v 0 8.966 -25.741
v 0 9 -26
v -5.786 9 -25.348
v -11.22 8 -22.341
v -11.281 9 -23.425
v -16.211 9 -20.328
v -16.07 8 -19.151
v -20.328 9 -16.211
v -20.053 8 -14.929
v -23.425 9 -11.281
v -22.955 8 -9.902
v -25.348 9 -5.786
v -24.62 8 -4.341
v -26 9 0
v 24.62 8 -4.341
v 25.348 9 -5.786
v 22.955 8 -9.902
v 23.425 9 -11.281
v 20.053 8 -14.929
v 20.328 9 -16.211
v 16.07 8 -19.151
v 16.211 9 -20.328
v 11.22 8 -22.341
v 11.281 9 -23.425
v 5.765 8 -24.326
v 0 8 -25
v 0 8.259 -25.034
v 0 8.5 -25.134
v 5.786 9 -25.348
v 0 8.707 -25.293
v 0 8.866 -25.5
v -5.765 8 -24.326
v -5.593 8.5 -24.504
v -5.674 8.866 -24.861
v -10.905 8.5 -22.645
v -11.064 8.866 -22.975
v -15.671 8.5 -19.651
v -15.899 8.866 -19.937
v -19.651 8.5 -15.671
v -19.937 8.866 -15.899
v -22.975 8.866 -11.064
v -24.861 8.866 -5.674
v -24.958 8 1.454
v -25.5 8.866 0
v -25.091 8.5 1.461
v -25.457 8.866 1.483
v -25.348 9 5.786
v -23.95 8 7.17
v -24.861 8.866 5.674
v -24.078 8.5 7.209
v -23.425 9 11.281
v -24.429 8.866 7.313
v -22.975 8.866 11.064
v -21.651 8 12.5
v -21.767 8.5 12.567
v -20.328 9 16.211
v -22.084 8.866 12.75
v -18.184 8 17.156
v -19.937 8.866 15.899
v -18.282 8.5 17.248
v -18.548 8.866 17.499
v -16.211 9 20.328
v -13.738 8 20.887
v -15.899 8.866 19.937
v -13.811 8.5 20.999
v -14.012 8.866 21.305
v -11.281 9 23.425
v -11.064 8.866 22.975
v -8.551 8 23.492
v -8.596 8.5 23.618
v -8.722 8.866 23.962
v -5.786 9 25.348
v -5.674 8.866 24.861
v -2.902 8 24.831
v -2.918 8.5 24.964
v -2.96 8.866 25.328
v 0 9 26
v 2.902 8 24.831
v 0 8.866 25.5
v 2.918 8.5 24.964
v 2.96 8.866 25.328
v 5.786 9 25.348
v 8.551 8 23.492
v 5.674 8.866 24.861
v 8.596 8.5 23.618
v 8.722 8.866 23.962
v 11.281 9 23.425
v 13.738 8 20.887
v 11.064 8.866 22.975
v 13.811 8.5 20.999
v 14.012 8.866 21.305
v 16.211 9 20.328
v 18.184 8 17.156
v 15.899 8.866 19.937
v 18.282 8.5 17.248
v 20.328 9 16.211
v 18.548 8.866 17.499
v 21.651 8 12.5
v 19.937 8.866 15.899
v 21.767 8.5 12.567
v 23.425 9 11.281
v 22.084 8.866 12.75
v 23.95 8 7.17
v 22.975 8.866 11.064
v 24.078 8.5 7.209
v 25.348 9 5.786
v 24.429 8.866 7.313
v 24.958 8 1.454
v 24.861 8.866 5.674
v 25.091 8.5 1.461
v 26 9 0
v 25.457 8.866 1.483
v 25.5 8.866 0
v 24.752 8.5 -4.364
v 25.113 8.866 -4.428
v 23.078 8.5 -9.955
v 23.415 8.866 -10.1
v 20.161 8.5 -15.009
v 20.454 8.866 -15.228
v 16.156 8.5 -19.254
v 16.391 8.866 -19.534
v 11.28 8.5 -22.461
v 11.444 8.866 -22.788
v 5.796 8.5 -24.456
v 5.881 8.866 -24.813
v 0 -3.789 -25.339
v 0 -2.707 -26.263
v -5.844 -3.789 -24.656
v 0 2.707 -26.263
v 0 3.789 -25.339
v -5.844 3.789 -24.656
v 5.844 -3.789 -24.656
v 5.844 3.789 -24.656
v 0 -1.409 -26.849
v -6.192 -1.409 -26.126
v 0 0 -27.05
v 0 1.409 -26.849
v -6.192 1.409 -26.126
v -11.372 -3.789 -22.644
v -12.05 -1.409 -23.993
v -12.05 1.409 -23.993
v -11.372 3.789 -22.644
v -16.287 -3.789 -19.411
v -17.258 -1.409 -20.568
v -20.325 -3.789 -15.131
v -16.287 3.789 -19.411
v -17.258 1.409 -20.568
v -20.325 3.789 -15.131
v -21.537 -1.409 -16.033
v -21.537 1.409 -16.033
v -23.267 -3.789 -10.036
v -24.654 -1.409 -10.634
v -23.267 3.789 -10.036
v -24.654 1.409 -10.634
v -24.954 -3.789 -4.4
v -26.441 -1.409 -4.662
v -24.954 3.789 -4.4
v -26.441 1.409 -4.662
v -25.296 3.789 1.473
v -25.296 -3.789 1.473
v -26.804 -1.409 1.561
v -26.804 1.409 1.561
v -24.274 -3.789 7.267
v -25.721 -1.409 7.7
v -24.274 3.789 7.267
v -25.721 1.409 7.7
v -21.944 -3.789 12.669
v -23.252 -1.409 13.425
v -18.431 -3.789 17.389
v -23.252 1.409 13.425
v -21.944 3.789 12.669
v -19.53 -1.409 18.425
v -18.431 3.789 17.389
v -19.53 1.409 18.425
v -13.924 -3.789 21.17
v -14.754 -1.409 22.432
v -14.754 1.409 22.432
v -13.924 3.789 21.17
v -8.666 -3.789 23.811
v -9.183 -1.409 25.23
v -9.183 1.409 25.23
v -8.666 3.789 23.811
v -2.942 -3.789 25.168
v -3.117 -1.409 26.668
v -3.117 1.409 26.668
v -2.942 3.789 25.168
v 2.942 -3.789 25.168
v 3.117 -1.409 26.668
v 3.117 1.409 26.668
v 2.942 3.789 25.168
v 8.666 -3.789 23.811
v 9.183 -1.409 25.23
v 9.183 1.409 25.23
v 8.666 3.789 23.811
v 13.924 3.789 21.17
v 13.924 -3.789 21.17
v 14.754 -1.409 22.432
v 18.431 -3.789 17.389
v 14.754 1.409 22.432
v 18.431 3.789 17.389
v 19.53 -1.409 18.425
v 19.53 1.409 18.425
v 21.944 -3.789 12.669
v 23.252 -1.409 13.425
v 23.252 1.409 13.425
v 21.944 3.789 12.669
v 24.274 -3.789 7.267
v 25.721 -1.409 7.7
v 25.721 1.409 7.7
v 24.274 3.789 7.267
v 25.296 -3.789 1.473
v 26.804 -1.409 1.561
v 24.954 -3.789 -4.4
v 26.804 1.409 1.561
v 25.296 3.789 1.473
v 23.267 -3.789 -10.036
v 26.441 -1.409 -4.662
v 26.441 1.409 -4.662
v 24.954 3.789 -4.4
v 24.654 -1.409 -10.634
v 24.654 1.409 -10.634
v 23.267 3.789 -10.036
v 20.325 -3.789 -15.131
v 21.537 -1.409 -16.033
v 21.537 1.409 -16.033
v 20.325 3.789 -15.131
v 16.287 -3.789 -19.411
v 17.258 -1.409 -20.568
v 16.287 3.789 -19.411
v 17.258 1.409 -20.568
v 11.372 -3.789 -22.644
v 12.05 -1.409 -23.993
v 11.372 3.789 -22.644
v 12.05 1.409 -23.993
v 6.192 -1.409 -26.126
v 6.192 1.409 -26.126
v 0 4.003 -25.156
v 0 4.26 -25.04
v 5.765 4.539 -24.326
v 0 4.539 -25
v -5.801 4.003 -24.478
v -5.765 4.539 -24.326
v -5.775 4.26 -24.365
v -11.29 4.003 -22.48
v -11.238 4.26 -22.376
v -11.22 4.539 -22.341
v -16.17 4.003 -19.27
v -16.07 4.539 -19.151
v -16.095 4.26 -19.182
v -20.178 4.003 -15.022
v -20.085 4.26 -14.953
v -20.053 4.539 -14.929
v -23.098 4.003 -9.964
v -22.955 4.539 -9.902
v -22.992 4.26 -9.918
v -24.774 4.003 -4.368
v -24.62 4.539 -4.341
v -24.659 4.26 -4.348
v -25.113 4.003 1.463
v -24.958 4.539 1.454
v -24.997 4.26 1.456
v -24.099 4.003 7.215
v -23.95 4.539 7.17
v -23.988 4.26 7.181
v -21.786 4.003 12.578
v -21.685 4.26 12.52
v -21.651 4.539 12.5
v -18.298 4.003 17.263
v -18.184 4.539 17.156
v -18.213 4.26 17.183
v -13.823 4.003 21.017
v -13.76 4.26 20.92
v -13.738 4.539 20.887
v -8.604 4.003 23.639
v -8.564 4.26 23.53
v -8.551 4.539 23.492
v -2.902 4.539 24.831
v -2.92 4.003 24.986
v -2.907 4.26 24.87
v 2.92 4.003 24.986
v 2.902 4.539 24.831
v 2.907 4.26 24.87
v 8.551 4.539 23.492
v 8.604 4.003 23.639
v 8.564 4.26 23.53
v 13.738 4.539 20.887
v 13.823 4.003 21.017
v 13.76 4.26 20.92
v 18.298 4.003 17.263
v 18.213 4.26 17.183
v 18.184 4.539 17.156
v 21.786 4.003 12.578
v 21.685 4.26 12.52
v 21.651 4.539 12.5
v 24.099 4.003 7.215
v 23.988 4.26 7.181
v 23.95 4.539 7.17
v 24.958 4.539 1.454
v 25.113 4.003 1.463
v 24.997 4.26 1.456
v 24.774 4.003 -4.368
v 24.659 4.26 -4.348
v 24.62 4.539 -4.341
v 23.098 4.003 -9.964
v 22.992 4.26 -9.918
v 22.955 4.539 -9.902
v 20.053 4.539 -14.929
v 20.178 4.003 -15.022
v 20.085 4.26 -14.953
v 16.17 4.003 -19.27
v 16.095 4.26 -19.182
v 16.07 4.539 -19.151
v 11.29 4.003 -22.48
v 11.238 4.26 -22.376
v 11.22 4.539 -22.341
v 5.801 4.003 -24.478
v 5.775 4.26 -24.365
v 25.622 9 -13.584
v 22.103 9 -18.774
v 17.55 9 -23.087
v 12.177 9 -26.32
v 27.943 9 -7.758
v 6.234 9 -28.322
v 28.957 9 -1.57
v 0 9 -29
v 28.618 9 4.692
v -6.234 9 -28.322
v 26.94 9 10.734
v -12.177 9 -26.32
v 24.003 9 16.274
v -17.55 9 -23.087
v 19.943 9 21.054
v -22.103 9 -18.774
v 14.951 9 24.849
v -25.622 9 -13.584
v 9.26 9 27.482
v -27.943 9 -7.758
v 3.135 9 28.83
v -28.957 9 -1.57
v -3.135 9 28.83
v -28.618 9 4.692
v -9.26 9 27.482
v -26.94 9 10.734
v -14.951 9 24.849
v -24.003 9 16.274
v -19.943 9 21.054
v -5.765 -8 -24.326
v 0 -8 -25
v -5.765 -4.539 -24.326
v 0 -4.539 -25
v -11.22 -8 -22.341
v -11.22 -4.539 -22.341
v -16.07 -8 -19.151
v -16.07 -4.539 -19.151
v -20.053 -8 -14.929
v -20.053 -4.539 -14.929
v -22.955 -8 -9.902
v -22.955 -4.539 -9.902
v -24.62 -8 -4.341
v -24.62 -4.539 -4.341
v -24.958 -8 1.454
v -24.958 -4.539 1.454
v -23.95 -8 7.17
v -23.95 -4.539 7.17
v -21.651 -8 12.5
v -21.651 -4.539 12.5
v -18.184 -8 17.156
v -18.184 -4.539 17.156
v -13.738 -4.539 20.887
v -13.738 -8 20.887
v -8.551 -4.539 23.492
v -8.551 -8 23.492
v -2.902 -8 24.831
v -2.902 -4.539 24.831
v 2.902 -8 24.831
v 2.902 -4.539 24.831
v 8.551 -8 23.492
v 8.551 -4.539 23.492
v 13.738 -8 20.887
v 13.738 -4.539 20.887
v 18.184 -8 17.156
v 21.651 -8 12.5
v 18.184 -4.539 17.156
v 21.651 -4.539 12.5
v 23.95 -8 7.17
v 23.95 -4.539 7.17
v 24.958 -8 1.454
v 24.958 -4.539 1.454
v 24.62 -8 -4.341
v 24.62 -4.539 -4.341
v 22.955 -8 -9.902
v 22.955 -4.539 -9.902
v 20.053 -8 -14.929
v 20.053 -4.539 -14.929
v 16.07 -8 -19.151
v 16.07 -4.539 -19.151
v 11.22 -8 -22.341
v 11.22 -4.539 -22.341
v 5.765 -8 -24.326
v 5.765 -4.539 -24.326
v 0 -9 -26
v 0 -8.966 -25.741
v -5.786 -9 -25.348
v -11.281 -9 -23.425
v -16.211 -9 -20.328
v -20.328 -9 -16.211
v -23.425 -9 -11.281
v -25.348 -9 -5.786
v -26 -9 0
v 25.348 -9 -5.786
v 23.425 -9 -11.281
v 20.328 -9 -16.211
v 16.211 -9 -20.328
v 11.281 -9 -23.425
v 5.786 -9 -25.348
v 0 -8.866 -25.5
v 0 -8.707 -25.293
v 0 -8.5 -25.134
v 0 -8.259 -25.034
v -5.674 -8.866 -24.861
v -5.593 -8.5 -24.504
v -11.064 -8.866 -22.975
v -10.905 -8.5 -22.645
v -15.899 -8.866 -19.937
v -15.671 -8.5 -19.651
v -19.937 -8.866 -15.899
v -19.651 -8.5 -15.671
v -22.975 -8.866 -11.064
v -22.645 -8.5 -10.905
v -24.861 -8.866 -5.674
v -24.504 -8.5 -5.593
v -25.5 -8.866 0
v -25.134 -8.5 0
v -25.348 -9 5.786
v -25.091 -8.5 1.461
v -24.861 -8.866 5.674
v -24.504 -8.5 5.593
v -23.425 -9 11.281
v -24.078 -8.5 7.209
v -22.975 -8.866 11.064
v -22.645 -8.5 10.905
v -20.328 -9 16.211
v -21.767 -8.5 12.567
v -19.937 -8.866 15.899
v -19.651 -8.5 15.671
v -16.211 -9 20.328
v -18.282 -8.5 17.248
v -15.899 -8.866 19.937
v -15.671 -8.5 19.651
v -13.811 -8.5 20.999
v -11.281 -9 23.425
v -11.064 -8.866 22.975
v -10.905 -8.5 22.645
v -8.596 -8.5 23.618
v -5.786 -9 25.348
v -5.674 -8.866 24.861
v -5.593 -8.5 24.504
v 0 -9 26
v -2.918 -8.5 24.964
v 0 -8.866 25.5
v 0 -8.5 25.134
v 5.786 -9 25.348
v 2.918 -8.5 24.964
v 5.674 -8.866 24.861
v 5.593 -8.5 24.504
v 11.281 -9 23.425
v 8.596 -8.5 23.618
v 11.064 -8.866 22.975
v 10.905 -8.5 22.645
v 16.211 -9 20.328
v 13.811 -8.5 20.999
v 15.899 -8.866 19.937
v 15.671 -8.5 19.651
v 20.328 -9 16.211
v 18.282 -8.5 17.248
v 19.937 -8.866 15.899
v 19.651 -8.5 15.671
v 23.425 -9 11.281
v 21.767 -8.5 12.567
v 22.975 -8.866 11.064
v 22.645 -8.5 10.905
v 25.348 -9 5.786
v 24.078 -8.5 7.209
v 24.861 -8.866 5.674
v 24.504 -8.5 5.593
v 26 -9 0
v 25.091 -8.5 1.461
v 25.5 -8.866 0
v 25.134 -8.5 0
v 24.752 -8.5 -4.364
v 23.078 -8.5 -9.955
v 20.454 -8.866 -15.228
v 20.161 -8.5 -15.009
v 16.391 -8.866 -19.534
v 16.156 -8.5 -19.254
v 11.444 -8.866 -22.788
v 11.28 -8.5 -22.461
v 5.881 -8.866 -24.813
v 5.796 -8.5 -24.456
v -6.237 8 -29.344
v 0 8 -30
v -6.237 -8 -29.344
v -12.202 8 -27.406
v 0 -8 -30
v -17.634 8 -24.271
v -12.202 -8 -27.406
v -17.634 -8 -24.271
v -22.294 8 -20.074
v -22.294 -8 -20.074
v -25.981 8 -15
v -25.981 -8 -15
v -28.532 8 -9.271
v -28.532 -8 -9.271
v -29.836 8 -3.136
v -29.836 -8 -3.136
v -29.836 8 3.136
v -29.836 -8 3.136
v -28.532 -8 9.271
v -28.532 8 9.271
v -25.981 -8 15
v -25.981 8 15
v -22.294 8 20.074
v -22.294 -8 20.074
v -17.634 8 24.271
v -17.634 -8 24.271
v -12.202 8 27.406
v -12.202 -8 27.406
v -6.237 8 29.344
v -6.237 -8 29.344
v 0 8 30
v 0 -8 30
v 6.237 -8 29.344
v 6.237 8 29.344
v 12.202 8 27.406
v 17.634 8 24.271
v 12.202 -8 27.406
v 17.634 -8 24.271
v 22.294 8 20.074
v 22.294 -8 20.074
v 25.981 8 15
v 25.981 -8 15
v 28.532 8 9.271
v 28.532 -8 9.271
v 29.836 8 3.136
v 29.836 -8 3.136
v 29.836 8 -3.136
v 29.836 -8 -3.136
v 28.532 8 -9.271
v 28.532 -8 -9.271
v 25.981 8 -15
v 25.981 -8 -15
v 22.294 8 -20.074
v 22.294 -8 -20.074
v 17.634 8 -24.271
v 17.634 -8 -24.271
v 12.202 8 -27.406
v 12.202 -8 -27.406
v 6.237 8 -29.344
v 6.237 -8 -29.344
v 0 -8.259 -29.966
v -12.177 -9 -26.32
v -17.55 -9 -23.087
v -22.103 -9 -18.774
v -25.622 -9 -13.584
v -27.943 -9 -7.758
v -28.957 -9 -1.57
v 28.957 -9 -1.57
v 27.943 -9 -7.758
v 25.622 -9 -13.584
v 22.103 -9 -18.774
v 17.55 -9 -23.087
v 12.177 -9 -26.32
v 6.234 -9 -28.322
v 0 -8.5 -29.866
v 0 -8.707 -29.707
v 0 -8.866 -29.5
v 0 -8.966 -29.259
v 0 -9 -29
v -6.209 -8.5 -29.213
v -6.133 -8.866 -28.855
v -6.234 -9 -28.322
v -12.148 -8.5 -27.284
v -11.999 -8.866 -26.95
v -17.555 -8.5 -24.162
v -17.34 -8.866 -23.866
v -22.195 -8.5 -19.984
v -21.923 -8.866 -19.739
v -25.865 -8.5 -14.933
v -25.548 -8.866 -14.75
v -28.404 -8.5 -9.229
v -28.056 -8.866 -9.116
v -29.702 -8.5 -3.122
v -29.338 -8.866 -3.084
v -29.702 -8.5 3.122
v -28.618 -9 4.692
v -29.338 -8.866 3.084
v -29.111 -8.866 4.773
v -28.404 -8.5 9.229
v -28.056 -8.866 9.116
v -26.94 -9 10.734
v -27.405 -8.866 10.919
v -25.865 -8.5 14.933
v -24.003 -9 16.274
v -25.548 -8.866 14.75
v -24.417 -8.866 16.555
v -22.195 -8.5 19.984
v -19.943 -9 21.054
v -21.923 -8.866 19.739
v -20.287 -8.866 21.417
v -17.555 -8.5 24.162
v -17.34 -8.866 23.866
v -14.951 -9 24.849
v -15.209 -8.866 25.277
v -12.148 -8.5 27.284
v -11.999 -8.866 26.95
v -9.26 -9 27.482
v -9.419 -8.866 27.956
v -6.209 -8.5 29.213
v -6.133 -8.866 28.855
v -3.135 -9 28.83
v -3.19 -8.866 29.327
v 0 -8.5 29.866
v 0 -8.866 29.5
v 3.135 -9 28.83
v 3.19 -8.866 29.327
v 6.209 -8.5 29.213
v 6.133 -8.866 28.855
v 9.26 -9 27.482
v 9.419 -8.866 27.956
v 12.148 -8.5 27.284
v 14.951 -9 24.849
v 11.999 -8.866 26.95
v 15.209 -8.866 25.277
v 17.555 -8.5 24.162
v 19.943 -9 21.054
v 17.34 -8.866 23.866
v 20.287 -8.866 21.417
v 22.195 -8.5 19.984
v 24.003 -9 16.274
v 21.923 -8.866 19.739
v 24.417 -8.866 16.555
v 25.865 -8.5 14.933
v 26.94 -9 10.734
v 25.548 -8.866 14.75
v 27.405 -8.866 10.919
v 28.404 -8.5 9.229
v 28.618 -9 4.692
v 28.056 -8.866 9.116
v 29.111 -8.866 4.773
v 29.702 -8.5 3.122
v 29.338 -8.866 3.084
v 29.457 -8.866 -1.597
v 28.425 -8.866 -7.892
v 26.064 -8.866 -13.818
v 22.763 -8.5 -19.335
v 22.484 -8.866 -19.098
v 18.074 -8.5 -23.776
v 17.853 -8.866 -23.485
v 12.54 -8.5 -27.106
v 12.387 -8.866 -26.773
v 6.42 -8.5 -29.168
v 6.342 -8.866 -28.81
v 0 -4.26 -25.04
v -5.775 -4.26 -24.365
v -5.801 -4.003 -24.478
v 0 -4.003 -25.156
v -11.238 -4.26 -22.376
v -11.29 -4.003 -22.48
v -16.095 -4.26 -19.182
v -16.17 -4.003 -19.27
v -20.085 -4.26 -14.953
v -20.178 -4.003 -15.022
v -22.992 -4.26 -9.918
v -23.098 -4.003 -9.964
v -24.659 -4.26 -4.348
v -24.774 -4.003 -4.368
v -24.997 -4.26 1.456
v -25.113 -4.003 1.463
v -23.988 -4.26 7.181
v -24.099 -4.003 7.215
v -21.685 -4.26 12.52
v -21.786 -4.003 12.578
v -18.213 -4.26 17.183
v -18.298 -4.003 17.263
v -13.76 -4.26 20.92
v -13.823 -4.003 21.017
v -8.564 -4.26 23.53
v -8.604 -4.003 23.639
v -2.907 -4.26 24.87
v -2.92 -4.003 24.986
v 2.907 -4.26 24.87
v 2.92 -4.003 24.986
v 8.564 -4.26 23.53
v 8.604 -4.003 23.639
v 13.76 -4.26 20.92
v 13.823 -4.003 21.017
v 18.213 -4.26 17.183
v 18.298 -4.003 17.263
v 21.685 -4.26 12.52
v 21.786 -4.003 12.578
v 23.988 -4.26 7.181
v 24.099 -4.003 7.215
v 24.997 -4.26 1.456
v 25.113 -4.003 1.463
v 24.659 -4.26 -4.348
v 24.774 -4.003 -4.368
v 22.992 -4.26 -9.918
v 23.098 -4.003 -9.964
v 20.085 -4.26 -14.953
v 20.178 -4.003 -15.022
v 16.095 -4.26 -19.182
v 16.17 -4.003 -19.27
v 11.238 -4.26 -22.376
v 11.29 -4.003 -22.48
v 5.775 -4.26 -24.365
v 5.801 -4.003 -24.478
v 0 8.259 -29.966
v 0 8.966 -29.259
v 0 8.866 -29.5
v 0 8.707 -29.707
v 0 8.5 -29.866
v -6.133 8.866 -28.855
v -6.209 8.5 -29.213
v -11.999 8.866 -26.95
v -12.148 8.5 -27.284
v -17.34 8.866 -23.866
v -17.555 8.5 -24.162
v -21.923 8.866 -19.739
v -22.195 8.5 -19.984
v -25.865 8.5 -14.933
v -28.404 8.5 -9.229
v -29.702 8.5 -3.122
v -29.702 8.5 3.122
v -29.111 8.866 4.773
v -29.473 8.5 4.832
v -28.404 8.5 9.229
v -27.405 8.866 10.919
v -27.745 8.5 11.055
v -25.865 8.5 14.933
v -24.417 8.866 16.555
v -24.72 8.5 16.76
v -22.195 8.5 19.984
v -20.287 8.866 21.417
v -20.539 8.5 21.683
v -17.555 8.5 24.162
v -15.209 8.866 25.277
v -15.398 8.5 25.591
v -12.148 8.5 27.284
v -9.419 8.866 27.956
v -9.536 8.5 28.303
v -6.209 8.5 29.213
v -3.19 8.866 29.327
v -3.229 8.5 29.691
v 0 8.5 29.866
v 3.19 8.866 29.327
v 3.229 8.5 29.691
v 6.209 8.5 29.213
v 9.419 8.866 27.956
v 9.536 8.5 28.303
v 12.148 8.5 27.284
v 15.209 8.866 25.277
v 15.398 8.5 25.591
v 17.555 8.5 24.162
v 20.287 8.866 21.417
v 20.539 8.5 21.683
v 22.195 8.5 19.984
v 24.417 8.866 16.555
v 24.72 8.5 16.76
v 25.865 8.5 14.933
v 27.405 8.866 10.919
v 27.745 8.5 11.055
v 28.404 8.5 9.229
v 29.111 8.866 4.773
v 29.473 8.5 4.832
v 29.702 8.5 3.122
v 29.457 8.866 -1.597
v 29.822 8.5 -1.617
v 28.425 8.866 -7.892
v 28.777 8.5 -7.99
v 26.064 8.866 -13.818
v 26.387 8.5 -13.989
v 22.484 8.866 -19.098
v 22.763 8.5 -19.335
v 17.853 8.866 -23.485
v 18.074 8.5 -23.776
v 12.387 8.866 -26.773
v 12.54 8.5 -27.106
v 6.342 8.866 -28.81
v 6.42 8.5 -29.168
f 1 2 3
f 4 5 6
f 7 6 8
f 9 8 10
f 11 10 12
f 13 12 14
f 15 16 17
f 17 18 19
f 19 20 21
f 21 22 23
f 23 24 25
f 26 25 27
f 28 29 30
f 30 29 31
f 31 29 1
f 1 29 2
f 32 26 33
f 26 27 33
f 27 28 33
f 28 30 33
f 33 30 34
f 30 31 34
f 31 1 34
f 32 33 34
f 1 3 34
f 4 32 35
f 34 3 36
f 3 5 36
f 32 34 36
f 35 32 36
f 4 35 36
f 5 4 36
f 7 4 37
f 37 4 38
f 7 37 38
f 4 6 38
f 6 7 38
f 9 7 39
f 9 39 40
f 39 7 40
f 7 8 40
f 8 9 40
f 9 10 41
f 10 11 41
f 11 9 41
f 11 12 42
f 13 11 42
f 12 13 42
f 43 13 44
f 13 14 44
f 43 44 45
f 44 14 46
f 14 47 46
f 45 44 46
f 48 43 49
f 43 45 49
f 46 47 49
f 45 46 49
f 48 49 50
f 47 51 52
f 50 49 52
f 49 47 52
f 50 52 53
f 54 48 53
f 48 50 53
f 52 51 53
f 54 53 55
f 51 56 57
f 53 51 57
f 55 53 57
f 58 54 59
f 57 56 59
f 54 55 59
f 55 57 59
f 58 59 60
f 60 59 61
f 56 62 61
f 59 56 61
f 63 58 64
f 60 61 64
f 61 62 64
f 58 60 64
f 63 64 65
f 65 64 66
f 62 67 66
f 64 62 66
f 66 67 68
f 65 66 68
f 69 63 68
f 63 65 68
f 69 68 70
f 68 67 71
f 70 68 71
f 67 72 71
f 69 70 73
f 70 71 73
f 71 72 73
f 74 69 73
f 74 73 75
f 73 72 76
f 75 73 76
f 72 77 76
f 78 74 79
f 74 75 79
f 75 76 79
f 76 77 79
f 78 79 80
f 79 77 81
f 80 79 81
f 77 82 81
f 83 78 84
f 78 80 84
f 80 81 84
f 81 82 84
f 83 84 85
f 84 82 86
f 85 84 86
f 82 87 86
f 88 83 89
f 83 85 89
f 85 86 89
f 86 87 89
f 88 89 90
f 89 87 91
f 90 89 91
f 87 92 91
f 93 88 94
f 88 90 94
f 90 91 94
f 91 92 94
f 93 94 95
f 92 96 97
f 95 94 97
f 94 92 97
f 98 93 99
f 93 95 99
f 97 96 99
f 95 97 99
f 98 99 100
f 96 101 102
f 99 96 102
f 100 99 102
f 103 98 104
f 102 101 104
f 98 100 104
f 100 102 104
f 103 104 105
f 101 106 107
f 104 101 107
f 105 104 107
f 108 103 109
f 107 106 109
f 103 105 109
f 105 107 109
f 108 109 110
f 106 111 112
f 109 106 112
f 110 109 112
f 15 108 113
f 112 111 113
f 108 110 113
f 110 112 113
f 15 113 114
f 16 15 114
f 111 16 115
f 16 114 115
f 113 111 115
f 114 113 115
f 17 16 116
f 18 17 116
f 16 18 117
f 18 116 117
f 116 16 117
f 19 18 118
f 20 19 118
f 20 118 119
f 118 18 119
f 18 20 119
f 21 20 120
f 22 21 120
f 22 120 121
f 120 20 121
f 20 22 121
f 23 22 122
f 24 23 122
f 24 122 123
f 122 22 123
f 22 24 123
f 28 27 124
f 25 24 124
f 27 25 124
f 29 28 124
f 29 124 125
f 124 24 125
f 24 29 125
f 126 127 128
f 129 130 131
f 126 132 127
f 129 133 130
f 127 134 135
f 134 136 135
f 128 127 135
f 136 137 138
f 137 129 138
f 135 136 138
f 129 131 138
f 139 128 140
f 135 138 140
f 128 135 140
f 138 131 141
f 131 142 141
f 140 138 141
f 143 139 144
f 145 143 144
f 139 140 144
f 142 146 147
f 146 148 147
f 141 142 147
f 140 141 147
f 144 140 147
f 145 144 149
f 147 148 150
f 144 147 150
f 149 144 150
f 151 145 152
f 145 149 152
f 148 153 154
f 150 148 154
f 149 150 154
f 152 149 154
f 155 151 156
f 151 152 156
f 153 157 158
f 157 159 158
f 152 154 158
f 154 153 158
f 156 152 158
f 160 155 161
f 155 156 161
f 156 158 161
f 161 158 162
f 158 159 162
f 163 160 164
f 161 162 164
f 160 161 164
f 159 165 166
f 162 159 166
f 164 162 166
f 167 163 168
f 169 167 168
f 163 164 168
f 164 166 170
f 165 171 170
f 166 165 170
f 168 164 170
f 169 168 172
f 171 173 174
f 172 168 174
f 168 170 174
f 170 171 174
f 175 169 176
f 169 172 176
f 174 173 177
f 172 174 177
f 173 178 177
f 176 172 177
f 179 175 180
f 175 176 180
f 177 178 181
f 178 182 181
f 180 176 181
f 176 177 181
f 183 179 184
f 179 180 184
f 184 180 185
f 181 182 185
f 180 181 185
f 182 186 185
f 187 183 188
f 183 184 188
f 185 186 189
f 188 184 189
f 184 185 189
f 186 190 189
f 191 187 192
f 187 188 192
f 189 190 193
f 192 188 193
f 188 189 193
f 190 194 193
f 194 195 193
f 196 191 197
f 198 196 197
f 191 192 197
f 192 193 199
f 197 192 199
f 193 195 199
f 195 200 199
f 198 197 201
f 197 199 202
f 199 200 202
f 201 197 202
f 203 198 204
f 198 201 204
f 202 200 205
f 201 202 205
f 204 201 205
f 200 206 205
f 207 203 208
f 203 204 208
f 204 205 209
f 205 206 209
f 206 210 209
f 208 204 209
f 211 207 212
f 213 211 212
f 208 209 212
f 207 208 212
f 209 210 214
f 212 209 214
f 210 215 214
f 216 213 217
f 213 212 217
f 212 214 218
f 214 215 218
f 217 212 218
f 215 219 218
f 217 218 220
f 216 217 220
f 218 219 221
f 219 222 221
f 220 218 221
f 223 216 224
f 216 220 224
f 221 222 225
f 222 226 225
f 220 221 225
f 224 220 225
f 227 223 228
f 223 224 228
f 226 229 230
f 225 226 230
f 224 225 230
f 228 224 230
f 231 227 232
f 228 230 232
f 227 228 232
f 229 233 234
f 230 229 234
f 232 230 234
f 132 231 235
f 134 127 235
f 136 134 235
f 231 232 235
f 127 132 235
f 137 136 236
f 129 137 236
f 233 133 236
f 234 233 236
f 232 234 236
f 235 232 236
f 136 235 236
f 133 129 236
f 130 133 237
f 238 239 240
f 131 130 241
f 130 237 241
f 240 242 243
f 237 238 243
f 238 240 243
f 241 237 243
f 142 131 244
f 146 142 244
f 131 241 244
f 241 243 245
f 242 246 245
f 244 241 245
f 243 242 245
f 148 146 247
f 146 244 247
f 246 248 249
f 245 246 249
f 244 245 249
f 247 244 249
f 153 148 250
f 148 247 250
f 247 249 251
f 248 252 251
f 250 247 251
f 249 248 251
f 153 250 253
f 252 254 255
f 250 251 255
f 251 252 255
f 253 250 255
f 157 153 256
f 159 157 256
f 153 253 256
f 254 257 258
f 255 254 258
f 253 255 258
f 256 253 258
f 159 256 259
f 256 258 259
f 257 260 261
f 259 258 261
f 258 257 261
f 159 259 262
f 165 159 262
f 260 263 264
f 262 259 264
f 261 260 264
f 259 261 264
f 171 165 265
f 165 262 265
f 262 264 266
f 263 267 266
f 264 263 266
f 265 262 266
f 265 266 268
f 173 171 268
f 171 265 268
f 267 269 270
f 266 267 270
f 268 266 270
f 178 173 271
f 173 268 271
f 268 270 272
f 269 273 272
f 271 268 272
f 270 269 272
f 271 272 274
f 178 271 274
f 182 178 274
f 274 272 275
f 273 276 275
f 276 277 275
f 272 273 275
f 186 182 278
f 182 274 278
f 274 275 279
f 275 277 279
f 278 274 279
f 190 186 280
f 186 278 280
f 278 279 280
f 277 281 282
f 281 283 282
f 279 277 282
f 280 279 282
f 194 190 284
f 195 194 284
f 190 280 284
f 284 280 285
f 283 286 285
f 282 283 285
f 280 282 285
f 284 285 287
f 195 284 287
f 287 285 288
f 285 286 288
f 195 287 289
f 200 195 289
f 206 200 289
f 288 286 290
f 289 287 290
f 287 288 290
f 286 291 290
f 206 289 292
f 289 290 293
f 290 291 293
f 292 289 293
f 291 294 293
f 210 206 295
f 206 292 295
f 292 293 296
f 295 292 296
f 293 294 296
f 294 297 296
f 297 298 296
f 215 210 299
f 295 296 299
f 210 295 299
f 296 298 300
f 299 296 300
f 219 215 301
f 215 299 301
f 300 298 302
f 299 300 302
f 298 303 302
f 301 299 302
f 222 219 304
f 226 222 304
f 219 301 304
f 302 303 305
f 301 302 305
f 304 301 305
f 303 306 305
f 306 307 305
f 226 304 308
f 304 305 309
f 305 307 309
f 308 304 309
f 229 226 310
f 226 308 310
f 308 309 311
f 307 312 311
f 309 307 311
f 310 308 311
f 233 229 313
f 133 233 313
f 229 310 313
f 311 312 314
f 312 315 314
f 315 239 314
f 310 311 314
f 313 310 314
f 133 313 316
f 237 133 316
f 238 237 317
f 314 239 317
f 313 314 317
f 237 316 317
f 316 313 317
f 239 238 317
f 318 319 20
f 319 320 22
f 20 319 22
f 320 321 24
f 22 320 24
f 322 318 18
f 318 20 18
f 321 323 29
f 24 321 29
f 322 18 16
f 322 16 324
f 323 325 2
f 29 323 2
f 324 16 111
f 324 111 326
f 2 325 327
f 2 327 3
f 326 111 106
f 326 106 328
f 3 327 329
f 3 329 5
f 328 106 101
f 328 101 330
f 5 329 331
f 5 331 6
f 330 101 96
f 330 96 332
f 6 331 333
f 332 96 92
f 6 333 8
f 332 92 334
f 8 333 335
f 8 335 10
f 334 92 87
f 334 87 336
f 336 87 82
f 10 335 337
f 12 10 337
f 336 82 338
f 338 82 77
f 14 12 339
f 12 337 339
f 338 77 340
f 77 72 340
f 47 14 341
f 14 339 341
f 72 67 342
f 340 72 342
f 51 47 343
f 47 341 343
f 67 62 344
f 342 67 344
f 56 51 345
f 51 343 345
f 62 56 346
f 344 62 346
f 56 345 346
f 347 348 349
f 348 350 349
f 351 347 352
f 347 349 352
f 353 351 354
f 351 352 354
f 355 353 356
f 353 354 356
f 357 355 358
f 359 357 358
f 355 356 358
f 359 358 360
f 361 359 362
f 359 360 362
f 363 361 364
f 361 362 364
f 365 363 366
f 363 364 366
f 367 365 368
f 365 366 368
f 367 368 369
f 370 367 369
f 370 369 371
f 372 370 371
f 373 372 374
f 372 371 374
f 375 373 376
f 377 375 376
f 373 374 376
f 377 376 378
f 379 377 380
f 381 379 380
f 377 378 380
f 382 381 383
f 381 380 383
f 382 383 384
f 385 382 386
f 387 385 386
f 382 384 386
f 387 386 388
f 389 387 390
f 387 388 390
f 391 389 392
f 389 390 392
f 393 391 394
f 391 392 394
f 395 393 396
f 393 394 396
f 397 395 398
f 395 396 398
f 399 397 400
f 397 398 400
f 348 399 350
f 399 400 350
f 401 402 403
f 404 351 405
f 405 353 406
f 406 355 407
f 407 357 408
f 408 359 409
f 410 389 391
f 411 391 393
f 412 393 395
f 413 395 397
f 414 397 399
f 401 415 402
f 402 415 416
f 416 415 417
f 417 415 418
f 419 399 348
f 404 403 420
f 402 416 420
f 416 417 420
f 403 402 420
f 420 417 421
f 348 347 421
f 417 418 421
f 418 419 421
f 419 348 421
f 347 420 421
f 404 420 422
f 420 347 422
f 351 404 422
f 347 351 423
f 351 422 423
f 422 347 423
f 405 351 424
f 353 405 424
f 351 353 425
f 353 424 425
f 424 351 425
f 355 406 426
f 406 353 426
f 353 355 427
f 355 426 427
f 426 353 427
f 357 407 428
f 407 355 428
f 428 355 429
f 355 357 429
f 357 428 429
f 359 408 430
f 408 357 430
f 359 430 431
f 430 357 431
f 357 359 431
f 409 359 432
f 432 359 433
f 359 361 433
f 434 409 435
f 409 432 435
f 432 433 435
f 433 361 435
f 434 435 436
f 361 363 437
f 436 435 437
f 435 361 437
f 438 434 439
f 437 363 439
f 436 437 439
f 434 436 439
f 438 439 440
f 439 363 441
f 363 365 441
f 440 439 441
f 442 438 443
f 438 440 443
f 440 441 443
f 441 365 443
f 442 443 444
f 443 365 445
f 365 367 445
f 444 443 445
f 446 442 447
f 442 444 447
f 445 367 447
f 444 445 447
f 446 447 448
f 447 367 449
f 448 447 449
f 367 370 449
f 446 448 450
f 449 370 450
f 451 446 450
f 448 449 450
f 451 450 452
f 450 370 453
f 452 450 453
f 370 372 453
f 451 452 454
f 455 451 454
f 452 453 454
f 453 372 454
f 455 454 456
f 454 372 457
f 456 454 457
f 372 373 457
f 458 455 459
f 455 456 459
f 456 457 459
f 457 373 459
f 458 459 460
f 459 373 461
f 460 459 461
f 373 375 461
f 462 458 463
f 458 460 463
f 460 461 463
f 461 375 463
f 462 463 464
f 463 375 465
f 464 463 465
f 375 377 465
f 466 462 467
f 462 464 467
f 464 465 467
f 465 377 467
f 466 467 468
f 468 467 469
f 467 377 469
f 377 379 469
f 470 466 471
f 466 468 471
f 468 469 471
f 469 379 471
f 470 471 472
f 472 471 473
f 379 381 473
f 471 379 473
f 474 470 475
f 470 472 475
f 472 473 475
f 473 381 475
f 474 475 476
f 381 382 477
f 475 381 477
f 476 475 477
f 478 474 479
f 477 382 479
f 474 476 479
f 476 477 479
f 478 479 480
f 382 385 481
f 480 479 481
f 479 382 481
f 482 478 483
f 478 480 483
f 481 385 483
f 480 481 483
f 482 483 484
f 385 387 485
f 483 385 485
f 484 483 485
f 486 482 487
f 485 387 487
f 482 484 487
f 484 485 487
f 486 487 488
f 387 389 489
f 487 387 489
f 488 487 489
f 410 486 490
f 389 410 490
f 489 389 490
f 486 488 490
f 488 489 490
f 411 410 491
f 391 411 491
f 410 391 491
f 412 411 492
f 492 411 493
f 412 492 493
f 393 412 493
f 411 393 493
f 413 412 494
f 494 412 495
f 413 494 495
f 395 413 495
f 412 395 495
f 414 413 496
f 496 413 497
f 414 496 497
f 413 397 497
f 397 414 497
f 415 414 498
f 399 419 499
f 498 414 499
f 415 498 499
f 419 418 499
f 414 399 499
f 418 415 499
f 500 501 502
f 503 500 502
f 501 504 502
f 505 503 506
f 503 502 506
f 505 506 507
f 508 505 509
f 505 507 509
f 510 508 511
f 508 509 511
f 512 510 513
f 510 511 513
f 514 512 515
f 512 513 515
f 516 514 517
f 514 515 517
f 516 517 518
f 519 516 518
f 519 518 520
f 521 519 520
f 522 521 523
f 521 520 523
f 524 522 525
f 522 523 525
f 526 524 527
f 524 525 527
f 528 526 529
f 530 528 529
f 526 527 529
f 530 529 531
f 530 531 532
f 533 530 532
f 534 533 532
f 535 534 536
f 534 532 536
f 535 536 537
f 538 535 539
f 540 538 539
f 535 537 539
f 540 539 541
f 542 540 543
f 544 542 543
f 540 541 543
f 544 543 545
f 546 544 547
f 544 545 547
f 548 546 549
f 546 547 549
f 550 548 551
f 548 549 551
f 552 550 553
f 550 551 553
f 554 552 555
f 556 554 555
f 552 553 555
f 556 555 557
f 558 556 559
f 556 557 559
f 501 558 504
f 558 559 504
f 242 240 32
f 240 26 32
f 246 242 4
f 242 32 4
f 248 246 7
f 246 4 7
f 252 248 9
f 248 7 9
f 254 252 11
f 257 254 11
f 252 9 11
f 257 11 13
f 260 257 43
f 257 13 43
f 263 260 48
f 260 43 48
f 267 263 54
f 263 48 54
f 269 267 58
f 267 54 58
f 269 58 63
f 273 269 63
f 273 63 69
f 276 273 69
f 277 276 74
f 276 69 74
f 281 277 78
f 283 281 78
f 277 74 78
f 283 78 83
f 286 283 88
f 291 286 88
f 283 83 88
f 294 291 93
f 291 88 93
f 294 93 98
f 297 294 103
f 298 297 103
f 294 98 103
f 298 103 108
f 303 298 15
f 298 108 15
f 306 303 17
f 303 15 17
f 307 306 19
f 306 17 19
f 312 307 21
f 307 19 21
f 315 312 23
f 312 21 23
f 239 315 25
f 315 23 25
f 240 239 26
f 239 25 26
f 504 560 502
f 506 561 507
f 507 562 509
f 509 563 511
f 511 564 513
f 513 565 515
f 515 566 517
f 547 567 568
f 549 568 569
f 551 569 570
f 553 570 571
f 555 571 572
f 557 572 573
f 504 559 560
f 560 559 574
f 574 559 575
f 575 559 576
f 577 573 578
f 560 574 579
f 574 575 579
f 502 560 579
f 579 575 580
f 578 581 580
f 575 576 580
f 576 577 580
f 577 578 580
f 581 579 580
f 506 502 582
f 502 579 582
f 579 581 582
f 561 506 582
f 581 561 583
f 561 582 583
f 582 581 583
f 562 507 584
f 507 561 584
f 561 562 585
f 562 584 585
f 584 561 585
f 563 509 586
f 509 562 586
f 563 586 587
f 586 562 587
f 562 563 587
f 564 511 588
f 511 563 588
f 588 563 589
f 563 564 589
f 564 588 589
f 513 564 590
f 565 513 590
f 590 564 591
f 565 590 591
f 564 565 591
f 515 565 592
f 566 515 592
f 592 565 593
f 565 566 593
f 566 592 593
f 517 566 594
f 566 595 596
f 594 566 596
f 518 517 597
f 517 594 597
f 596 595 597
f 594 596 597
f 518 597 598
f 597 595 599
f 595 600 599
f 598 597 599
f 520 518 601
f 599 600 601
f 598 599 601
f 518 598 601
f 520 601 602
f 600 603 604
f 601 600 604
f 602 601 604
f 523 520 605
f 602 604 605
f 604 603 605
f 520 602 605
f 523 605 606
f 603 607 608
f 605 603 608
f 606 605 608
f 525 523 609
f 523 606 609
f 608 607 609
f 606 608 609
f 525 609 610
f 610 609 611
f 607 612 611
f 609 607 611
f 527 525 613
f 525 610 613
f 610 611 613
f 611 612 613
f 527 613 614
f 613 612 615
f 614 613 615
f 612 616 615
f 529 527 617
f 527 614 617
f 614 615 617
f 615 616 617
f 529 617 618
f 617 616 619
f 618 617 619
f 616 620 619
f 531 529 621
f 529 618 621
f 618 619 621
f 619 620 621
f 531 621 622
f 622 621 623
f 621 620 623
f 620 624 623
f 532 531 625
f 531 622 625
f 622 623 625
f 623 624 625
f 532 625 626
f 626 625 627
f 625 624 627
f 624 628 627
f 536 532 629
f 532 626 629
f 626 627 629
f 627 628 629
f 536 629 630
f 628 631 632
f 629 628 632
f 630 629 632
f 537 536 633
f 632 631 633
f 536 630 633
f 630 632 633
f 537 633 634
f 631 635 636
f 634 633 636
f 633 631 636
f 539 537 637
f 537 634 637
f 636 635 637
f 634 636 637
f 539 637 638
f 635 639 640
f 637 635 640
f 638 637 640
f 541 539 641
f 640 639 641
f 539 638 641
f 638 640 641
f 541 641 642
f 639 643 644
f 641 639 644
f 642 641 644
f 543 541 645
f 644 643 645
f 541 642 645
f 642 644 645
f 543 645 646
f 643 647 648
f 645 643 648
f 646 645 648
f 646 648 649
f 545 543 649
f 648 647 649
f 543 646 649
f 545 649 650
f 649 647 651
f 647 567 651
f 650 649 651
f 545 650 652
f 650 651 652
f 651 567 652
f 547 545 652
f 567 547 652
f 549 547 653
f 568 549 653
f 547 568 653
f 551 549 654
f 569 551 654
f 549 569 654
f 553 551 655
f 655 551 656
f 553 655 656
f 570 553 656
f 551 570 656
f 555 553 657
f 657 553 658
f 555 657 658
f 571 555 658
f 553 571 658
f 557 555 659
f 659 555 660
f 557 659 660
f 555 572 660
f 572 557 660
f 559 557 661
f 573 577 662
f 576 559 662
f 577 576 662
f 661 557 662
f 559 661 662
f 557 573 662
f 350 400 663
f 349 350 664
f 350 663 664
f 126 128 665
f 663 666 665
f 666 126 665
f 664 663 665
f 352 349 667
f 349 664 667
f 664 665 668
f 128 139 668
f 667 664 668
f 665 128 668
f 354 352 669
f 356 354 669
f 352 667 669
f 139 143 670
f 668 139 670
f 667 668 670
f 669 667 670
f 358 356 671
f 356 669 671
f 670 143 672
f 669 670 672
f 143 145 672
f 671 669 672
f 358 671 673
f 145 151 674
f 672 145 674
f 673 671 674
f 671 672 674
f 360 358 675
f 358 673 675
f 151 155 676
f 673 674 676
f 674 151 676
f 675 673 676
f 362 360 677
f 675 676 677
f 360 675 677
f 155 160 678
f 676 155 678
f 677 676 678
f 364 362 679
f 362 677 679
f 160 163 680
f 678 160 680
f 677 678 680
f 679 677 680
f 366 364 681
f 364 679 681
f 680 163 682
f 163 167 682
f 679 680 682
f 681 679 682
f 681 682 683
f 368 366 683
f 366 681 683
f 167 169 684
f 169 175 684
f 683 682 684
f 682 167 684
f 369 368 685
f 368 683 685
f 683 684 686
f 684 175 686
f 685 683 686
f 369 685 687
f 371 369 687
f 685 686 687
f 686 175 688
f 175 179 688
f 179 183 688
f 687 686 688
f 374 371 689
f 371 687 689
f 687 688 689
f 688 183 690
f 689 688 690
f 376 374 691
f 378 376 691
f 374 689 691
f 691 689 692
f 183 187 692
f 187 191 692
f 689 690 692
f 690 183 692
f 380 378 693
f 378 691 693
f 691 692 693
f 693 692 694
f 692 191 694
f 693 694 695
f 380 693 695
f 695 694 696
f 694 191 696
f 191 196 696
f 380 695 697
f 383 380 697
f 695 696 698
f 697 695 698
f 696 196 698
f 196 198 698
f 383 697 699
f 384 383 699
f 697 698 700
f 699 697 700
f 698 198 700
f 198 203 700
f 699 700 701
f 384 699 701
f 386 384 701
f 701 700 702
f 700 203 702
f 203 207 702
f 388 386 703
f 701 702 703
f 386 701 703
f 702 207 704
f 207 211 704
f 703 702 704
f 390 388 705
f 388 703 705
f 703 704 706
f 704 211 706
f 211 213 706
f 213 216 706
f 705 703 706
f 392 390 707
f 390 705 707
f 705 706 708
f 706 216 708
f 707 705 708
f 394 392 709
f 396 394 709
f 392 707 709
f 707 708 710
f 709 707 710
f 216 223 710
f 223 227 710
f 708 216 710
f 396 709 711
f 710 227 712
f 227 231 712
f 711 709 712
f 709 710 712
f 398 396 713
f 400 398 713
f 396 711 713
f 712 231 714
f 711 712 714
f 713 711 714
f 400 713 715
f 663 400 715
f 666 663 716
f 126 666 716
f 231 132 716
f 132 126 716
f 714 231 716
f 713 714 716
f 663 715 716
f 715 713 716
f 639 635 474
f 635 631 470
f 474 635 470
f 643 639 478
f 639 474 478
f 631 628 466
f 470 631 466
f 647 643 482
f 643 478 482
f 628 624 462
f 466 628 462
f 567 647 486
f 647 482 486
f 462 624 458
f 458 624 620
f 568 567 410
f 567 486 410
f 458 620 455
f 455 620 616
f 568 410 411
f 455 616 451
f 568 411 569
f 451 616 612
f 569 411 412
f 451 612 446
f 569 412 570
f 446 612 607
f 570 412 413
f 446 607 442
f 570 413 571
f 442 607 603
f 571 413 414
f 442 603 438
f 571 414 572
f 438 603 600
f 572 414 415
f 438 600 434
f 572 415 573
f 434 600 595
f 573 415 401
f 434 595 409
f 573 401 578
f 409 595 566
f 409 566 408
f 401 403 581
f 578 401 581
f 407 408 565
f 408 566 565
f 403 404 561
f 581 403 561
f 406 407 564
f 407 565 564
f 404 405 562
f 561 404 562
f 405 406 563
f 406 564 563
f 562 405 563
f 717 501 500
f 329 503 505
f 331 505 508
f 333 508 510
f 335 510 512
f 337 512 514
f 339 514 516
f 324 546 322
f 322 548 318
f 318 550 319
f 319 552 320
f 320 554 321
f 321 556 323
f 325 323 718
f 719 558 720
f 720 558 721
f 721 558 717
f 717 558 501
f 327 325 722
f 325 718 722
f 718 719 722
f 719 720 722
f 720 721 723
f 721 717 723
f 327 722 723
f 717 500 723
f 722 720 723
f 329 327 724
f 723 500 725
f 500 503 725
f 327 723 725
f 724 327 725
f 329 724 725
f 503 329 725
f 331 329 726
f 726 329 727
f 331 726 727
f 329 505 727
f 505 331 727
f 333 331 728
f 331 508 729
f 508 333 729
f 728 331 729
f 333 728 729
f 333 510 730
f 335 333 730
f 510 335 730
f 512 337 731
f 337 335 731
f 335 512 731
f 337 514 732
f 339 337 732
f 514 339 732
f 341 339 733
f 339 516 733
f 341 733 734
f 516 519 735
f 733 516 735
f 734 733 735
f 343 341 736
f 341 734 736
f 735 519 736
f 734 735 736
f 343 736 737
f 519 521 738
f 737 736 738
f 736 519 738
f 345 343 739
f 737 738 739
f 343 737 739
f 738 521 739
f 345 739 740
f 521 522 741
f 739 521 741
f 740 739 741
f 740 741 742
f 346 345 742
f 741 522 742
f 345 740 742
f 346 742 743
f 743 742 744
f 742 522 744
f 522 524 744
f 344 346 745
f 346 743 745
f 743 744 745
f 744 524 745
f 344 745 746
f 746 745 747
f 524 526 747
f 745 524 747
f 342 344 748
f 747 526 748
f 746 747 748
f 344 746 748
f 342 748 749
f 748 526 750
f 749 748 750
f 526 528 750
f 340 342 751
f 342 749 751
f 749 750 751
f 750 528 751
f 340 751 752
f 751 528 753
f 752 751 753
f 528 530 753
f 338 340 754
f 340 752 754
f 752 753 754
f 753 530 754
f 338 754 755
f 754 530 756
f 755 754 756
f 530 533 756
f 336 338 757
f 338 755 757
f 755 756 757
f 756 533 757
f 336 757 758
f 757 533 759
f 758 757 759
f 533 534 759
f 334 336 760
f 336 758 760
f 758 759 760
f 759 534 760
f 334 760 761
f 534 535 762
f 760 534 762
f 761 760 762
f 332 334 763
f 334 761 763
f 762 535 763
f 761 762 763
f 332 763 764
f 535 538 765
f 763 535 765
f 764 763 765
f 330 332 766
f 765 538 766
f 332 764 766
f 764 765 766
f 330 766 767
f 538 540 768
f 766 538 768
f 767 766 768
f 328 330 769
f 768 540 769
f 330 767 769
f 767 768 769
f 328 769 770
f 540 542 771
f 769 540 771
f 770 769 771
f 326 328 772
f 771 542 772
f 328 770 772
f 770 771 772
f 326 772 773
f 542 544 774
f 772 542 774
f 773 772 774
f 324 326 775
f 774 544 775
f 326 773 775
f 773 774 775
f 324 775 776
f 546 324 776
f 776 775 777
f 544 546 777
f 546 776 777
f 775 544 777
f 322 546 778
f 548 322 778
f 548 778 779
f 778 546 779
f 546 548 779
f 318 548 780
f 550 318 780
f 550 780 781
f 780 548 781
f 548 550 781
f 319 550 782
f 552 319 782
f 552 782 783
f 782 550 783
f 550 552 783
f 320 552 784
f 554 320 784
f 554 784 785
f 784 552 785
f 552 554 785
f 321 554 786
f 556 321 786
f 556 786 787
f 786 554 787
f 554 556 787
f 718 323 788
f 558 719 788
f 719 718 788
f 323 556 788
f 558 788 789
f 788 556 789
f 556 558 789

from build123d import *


with BuildPart() as part:
    # Sketch1 → Revolve1 (revolve)
    with BuildSketch(Plane(origin=(0, 0, 0), x_dir=(0, 0, -1), z_dir=(1, 0, 0))):
        with BuildLine():
            Line((25, -8), (25, -4.538997687))
            ThreePointArc((25, -4.538997687), (25.088639197, -4.127389271), (25.338842975, -3.788750135))
            ThreePointArc((25.338842975, -3.788750135), (27.05, 0), (25.338842975, 3.788750135))
            ThreePointArc((25.338842975, 3.788750135), (25.088639197, 4.127389271), (25, 4.538997687))
            Line((25, 4.538997687), (25, 8))
            ThreePointArc((25, 8), (25.292893219, 8.707106781), (26, 9))
            Line((26, 9), (29, 9))
            ThreePointArc((29, 9), (29.707106781, 8.707106781), (30, 8))
            Line((30, 8), (30, -8))
            ThreePointArc((30, -8), (29.707106781, -8.707106781), (29, -9))
            Line((29, -9), (26, -9))
            ThreePointArc((26, -9), (25.292893219, -8.707106781), (25, -8))
        make_face()
    revolve(axis=Axis((0, 0, 0), (0, 1, 0)))


solid = part.part
